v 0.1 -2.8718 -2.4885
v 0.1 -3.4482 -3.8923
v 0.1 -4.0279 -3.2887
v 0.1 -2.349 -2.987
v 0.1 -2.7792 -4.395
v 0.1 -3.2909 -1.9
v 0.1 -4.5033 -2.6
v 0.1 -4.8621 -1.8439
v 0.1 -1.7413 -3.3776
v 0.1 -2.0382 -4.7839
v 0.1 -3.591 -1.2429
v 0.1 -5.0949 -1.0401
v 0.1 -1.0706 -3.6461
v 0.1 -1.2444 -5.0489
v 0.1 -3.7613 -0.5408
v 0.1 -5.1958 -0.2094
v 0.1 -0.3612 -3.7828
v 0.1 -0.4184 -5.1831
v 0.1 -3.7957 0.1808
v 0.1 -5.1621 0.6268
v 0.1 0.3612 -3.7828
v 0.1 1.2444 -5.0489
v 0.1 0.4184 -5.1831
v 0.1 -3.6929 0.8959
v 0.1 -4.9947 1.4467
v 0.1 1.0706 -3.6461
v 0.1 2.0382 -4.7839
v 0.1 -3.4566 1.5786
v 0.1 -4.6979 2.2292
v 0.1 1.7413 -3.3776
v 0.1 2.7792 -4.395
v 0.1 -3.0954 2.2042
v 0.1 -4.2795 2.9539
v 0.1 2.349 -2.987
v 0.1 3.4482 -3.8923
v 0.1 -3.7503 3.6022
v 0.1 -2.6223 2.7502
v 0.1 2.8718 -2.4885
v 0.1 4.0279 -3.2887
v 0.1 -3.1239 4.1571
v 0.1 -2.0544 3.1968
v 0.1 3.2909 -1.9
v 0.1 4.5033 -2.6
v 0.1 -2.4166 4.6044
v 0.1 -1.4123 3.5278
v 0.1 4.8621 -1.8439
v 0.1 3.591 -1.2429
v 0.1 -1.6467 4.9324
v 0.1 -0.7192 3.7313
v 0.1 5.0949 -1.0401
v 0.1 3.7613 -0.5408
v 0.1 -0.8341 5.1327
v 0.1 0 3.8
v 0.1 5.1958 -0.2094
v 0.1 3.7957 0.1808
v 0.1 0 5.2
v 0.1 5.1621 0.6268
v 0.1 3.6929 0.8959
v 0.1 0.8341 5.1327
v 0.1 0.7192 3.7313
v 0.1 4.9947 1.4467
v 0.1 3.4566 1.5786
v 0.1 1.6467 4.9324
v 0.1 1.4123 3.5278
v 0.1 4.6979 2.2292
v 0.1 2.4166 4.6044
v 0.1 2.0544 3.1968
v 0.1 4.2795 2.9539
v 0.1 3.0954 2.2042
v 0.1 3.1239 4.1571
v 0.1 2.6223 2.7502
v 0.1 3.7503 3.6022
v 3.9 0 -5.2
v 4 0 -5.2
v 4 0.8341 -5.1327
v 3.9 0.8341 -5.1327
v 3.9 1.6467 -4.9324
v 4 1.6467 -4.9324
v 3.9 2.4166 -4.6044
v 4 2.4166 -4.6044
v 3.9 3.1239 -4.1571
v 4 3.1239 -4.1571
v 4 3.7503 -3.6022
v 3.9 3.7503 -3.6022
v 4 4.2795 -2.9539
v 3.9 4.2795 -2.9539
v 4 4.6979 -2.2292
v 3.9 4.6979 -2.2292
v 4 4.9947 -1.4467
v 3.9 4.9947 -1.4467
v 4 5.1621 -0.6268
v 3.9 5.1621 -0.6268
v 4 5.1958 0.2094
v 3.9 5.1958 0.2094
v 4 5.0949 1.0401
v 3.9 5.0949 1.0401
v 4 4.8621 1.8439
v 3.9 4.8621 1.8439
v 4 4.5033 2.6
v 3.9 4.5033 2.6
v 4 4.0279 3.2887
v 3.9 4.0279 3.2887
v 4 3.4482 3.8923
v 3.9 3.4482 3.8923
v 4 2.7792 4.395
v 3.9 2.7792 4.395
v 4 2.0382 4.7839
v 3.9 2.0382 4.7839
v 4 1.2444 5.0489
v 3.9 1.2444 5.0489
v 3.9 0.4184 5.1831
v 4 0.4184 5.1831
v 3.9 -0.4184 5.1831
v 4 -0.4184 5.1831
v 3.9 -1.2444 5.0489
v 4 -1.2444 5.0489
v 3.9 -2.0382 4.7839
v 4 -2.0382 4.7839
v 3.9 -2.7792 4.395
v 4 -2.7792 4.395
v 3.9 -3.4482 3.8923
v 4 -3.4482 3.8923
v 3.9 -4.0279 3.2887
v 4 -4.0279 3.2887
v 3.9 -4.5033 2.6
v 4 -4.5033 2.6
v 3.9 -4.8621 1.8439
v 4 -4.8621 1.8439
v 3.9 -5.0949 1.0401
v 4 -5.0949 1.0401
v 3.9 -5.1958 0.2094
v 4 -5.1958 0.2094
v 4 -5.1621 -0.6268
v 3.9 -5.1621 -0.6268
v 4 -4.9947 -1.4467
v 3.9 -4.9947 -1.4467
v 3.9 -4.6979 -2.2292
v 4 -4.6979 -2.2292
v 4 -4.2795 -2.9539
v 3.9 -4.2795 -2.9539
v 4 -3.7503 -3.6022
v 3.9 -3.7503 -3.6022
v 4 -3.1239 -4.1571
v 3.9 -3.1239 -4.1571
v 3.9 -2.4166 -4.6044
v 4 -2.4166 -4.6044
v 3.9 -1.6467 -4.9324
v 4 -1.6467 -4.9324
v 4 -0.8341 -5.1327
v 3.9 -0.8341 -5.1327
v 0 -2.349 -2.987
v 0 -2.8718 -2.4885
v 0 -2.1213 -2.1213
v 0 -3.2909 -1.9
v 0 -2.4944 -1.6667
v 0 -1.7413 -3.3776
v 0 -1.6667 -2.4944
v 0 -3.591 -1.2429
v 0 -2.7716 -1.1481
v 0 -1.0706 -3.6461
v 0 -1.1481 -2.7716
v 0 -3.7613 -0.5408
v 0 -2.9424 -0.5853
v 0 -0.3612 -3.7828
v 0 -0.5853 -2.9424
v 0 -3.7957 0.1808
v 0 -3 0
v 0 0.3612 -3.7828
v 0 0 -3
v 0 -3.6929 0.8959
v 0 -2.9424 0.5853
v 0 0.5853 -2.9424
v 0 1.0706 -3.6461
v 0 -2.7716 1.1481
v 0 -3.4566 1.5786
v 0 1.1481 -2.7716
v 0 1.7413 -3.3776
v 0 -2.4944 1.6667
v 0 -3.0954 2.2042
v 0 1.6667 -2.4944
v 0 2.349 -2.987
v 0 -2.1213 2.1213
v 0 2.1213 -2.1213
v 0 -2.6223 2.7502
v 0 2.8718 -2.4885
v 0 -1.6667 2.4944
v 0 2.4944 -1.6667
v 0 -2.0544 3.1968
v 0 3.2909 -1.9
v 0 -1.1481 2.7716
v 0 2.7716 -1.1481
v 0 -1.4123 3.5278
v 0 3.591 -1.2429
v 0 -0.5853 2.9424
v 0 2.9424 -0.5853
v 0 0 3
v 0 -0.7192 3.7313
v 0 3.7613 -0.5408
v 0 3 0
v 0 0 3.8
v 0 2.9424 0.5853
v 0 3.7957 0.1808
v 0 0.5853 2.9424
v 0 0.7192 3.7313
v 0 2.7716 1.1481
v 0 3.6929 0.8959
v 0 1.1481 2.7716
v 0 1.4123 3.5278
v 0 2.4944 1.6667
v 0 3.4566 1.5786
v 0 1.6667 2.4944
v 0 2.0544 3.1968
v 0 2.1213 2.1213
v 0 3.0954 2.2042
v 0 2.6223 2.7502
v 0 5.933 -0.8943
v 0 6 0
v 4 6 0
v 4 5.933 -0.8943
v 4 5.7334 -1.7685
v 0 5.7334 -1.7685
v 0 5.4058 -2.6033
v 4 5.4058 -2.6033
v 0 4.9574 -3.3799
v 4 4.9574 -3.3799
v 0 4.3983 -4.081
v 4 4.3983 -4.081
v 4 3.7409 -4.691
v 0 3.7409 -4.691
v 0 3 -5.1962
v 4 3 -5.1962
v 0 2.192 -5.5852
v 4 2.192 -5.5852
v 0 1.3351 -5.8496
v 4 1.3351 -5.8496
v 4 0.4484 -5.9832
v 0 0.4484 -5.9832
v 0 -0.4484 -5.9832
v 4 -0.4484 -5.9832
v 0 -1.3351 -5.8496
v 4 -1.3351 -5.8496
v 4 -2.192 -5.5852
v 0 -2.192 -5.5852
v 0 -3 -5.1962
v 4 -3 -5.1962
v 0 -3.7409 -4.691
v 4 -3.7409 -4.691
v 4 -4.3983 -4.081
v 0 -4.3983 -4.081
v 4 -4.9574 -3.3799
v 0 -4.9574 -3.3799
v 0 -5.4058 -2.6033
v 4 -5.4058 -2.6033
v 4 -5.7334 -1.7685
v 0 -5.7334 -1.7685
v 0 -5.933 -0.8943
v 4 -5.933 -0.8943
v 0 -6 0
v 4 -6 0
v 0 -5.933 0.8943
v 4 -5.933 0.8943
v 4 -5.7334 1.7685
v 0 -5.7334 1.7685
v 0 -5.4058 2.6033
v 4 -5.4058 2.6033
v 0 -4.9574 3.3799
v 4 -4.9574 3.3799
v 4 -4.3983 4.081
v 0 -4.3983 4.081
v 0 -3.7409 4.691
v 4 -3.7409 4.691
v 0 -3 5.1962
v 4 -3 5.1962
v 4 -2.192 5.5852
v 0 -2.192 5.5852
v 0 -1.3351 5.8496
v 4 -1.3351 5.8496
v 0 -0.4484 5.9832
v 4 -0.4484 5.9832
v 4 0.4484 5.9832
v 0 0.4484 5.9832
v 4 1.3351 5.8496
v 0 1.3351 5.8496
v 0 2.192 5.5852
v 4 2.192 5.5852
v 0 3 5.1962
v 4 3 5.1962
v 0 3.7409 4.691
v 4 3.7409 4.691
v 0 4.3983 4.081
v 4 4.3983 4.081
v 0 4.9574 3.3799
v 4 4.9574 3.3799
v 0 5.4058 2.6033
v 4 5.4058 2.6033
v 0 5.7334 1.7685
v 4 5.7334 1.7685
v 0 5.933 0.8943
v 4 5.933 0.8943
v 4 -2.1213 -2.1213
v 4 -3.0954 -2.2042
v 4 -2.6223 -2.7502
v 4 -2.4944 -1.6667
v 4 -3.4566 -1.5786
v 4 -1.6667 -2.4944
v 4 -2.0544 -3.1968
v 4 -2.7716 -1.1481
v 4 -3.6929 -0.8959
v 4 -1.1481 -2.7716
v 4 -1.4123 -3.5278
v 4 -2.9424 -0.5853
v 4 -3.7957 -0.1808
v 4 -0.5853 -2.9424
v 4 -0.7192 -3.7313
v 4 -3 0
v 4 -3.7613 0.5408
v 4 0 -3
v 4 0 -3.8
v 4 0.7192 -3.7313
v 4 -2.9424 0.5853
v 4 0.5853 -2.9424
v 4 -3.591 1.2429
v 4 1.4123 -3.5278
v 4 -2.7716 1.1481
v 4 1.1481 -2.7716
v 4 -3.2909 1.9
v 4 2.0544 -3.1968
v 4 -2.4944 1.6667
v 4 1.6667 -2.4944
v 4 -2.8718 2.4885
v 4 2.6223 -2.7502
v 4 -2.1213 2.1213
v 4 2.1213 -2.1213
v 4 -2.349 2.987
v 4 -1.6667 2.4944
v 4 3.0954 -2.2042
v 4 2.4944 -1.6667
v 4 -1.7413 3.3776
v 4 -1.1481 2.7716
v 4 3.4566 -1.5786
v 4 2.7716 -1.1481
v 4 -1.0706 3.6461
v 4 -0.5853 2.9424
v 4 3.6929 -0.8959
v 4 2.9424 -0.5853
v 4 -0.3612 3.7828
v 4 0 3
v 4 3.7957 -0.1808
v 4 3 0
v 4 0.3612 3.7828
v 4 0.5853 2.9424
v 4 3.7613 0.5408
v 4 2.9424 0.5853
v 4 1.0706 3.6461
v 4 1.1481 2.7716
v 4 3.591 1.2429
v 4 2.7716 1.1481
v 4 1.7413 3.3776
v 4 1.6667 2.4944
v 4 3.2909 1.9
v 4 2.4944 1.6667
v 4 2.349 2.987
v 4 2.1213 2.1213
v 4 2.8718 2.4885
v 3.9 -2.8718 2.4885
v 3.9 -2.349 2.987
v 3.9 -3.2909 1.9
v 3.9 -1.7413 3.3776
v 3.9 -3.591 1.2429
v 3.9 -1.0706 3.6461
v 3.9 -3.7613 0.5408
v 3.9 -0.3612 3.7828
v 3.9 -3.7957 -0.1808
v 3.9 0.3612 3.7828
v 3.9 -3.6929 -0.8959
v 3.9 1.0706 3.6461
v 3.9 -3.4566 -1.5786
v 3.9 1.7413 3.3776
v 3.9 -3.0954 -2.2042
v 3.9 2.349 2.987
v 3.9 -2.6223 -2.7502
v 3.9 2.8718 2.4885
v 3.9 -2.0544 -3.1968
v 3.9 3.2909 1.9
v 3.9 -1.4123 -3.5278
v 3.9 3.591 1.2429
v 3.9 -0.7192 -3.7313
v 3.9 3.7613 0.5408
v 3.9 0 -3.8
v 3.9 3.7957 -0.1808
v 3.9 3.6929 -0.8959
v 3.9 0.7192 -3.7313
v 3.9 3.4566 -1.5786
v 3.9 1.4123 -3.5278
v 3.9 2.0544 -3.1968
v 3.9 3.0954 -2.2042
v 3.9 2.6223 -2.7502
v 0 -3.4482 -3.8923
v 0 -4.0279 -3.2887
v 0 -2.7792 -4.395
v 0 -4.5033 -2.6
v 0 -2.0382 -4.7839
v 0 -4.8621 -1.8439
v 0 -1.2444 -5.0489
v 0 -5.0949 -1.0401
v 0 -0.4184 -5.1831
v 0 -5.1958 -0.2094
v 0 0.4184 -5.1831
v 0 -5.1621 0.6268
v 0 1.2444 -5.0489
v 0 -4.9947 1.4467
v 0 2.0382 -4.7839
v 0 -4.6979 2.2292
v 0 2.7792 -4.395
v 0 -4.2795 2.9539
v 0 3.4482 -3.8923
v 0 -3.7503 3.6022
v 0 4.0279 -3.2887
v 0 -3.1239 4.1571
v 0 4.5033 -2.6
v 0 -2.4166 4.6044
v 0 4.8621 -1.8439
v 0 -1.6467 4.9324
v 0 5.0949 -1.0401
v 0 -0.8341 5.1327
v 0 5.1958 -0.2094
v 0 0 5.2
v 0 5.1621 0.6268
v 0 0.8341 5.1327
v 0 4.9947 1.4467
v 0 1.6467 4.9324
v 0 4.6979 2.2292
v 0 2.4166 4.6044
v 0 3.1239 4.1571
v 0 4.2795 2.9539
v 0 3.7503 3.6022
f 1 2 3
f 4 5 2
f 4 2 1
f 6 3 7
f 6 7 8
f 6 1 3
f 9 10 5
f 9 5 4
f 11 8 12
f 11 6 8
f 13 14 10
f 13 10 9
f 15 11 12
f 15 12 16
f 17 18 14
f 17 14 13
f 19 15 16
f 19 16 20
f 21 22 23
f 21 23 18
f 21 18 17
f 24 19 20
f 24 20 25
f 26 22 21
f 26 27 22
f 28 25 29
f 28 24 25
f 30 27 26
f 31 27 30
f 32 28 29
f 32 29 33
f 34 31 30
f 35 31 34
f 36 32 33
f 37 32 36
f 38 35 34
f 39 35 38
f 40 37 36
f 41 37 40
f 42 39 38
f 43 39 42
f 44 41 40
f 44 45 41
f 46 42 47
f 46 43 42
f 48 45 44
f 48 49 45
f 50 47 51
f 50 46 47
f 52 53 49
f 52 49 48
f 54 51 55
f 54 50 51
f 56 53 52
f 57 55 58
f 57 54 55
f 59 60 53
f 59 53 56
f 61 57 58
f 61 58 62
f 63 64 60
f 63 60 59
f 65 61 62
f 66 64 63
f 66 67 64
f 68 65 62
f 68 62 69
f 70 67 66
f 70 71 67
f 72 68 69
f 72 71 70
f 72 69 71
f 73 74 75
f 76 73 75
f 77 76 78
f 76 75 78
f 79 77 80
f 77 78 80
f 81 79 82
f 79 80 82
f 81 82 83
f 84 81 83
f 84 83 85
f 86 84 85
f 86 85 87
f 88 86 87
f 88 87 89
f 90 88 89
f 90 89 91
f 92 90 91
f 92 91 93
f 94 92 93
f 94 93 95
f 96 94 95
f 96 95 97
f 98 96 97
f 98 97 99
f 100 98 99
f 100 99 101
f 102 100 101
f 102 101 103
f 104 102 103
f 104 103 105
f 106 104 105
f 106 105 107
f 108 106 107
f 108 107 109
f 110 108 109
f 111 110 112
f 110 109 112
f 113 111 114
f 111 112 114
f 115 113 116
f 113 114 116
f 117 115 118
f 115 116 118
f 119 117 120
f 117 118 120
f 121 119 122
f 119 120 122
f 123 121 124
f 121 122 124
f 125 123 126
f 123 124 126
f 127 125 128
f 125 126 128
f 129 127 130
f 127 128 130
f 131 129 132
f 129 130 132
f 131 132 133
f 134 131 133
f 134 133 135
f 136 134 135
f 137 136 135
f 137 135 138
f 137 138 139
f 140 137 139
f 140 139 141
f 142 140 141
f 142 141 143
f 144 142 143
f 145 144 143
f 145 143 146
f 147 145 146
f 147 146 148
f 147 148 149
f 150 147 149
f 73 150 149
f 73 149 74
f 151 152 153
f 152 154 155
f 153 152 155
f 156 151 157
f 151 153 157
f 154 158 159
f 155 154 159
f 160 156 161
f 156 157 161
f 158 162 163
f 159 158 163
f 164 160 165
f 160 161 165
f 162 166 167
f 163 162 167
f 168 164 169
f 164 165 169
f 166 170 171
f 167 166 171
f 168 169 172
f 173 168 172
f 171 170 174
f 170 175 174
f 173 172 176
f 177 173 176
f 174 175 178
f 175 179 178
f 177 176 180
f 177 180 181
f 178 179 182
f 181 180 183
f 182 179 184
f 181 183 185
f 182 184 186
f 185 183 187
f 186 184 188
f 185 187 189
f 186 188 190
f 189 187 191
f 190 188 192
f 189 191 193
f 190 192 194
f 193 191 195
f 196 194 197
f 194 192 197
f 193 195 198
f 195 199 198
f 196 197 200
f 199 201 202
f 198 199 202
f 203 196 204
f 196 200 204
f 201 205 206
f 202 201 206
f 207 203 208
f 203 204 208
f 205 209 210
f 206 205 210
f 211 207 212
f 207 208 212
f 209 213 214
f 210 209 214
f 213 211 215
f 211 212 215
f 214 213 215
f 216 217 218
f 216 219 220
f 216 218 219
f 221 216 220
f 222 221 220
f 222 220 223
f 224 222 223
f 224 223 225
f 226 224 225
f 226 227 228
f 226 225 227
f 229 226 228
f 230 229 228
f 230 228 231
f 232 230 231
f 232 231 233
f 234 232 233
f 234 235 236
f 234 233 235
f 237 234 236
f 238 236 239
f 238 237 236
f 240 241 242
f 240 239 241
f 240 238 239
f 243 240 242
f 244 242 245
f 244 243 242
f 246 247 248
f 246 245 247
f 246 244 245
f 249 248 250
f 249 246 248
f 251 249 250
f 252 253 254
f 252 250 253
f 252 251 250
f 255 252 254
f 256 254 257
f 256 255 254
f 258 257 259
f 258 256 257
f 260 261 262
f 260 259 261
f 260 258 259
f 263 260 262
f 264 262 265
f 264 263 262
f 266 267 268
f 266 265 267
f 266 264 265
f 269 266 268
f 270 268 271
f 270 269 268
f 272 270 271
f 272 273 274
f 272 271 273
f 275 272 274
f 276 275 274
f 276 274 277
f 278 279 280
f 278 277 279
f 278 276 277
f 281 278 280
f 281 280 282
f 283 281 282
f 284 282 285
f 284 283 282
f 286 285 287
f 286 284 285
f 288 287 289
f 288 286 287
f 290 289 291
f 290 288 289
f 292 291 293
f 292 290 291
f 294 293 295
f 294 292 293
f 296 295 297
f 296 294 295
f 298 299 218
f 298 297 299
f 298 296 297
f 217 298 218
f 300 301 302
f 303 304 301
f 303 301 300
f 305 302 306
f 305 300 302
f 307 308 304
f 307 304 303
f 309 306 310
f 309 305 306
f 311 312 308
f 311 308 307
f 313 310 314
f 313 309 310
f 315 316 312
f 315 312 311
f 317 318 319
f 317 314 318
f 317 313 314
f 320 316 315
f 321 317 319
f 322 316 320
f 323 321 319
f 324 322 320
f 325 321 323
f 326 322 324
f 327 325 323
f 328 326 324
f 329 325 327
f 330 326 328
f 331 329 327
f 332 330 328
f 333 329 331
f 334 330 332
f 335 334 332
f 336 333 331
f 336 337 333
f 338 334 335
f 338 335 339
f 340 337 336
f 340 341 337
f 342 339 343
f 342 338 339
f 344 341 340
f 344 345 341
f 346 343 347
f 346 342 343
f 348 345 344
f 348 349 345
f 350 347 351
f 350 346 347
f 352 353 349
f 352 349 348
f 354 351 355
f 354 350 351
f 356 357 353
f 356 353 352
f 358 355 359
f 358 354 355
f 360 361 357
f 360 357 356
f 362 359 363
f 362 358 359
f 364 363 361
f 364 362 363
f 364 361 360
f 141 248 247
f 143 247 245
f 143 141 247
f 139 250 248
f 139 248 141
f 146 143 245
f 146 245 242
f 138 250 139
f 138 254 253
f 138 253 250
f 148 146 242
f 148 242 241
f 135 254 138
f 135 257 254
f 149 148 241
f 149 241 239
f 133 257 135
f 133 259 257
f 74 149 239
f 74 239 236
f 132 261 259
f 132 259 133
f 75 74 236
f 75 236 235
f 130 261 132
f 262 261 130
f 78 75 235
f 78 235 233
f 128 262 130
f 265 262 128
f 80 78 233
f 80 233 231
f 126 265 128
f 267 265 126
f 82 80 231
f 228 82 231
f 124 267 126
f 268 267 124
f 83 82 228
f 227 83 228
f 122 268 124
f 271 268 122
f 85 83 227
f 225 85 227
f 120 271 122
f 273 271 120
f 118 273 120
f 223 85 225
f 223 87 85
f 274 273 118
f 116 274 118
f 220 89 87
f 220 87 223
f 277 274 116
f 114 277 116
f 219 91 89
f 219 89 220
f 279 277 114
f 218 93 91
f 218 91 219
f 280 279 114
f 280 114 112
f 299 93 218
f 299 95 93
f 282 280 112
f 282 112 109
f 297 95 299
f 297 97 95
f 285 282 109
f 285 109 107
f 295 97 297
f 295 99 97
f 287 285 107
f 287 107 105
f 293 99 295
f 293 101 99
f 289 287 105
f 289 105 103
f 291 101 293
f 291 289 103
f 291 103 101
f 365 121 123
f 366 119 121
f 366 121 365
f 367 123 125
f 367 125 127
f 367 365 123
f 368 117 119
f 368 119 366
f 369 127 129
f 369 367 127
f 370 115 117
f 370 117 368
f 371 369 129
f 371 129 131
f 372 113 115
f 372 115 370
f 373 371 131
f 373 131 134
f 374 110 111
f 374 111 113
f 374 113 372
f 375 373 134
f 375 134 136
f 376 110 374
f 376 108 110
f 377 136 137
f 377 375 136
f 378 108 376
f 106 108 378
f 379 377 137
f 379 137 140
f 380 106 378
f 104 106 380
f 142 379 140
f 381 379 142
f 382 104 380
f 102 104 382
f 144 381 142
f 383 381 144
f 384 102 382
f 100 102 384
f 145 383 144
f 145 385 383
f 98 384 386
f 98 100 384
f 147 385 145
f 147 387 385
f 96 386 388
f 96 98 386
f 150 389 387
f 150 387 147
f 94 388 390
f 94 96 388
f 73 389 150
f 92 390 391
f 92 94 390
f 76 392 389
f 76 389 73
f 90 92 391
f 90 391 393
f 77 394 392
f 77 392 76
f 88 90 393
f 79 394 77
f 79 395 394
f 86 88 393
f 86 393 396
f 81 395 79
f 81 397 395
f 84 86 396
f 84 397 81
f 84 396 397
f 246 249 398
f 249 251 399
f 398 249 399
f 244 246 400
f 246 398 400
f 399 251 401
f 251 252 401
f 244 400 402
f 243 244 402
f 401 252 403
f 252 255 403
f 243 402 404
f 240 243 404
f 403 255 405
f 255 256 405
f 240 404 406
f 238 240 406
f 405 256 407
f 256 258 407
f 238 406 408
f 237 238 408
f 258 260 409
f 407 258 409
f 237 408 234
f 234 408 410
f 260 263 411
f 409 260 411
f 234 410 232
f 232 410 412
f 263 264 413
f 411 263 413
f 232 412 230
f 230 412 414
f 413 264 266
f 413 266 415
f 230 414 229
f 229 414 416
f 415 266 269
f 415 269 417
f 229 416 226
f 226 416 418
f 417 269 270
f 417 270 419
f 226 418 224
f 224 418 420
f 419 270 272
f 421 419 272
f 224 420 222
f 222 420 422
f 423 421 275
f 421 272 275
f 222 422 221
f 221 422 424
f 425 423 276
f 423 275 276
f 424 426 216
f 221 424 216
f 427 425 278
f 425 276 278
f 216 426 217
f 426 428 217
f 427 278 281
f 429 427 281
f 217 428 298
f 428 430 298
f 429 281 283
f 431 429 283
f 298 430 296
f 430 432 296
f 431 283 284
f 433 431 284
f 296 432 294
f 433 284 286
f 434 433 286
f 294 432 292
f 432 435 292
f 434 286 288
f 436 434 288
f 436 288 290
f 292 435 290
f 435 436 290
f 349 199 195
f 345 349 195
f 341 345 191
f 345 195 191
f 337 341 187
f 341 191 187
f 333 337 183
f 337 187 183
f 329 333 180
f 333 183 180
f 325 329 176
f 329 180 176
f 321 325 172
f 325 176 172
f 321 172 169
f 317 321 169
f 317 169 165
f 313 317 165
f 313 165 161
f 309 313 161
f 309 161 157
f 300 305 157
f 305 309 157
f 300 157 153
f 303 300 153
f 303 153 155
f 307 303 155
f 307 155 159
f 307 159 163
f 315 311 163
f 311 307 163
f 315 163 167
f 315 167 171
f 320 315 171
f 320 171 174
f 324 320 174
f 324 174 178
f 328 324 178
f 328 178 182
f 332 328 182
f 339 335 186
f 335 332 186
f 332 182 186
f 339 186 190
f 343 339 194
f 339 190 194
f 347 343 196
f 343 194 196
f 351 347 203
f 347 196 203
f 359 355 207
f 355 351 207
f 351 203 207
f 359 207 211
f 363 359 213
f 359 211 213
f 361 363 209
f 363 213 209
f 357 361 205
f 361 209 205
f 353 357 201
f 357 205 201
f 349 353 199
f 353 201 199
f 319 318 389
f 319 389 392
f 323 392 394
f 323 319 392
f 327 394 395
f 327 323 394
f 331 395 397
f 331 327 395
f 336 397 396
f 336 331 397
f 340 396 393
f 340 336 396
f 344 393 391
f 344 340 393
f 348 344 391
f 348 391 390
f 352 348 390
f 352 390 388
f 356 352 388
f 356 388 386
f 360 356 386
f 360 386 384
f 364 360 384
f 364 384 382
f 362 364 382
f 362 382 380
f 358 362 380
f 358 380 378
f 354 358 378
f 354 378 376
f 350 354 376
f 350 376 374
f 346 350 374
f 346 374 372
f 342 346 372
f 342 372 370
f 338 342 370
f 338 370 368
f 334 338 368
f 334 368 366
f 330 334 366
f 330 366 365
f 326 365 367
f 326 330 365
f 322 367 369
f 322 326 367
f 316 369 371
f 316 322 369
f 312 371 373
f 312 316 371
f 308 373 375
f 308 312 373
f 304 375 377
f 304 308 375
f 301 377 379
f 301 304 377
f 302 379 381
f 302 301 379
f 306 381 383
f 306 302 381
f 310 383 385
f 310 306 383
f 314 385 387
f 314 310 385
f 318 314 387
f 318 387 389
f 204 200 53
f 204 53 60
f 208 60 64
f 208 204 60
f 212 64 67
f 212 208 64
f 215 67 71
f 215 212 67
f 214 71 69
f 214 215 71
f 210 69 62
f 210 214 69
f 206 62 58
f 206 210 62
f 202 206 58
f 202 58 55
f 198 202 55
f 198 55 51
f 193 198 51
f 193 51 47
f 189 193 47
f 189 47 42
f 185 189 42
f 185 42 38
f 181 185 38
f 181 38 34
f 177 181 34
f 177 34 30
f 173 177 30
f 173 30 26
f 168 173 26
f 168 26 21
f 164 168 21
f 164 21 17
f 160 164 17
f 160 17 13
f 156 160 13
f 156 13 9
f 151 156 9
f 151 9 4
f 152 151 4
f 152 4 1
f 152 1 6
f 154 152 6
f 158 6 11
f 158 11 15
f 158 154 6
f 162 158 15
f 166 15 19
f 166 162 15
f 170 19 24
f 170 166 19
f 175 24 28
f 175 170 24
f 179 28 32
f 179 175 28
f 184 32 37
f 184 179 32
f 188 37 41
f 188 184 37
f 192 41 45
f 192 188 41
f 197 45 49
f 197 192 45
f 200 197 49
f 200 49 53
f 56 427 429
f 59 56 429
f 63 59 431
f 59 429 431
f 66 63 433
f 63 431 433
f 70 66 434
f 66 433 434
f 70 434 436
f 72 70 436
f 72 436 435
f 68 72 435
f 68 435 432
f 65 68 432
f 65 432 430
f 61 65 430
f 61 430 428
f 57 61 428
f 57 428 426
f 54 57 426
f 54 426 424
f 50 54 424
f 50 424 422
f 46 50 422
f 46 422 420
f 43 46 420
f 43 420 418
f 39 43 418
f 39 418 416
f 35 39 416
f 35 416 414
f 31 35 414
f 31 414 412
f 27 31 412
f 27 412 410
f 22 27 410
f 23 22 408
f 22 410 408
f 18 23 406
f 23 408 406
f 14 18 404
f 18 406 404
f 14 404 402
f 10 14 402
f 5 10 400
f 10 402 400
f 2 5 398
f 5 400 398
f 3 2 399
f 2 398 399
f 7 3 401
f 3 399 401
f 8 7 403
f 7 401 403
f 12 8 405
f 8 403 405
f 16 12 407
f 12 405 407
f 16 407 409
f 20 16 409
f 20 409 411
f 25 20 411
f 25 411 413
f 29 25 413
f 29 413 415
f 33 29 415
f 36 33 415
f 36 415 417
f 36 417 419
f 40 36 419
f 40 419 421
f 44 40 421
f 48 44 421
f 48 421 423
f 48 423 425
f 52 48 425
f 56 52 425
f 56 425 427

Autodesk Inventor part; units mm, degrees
ref_plane "YZ Plane" through (0, 0, 0) normal (1, 0, 0) x (0, 1, 0)
ref_plane "XZ Plane" through (0, 0, 0) normal (0, 1, 0) x (-1, 0, 0)
ref_plane "XY Plane" through (0, 0, 0) normal (0, 0, 1) x (1, 0, 0)
sketch "Sketch1" plane through (0, 0, 0) normal (1, 0, 0) x (0, 1, 0)
  circle A0 centre (0, 0) radius 6
  circle A1 centre (0, 0) radius 3
  dimension "d0" = 12
  dimension "d1" = 6
extrude "Extrusion1" add sketch "Sketch1" along normal blind 4
sketch "Sketch2" plane through (0, 0, 0) normal (-1, 0, 0) x (0, 0, 1)
  circle A0 centre (0, 0) radius 6 projected
  circle A1 centre (0, 0) radius 3 projected
  circle A2 centre (0, 0) radius 5.2
  circle A3 centre (0, 0) radius 3.8
  dimension "d4" = 0.8
  dimension "d5" = 0.8
extrude "Extrusion2" cut sketch "Sketch2" against normal blind 0.1 contours A2
sketch "Sketch3" plane through (4, 0, 0) normal (1, 0, 0) x (0, 0, -1)
  circle A0 centre (0, 0) radius 6 projected
  circle A1 centre (0, 0) radius 5.2 projected
  circle A2 centre (0, 0) radius 3.8 projected
extrude "Extrusion3" cut sketch "Sketch3" against normal blind 0.1 contours A1
properties part number "MR126ZZ-6x12x4mm" material "Stainless Steel"
